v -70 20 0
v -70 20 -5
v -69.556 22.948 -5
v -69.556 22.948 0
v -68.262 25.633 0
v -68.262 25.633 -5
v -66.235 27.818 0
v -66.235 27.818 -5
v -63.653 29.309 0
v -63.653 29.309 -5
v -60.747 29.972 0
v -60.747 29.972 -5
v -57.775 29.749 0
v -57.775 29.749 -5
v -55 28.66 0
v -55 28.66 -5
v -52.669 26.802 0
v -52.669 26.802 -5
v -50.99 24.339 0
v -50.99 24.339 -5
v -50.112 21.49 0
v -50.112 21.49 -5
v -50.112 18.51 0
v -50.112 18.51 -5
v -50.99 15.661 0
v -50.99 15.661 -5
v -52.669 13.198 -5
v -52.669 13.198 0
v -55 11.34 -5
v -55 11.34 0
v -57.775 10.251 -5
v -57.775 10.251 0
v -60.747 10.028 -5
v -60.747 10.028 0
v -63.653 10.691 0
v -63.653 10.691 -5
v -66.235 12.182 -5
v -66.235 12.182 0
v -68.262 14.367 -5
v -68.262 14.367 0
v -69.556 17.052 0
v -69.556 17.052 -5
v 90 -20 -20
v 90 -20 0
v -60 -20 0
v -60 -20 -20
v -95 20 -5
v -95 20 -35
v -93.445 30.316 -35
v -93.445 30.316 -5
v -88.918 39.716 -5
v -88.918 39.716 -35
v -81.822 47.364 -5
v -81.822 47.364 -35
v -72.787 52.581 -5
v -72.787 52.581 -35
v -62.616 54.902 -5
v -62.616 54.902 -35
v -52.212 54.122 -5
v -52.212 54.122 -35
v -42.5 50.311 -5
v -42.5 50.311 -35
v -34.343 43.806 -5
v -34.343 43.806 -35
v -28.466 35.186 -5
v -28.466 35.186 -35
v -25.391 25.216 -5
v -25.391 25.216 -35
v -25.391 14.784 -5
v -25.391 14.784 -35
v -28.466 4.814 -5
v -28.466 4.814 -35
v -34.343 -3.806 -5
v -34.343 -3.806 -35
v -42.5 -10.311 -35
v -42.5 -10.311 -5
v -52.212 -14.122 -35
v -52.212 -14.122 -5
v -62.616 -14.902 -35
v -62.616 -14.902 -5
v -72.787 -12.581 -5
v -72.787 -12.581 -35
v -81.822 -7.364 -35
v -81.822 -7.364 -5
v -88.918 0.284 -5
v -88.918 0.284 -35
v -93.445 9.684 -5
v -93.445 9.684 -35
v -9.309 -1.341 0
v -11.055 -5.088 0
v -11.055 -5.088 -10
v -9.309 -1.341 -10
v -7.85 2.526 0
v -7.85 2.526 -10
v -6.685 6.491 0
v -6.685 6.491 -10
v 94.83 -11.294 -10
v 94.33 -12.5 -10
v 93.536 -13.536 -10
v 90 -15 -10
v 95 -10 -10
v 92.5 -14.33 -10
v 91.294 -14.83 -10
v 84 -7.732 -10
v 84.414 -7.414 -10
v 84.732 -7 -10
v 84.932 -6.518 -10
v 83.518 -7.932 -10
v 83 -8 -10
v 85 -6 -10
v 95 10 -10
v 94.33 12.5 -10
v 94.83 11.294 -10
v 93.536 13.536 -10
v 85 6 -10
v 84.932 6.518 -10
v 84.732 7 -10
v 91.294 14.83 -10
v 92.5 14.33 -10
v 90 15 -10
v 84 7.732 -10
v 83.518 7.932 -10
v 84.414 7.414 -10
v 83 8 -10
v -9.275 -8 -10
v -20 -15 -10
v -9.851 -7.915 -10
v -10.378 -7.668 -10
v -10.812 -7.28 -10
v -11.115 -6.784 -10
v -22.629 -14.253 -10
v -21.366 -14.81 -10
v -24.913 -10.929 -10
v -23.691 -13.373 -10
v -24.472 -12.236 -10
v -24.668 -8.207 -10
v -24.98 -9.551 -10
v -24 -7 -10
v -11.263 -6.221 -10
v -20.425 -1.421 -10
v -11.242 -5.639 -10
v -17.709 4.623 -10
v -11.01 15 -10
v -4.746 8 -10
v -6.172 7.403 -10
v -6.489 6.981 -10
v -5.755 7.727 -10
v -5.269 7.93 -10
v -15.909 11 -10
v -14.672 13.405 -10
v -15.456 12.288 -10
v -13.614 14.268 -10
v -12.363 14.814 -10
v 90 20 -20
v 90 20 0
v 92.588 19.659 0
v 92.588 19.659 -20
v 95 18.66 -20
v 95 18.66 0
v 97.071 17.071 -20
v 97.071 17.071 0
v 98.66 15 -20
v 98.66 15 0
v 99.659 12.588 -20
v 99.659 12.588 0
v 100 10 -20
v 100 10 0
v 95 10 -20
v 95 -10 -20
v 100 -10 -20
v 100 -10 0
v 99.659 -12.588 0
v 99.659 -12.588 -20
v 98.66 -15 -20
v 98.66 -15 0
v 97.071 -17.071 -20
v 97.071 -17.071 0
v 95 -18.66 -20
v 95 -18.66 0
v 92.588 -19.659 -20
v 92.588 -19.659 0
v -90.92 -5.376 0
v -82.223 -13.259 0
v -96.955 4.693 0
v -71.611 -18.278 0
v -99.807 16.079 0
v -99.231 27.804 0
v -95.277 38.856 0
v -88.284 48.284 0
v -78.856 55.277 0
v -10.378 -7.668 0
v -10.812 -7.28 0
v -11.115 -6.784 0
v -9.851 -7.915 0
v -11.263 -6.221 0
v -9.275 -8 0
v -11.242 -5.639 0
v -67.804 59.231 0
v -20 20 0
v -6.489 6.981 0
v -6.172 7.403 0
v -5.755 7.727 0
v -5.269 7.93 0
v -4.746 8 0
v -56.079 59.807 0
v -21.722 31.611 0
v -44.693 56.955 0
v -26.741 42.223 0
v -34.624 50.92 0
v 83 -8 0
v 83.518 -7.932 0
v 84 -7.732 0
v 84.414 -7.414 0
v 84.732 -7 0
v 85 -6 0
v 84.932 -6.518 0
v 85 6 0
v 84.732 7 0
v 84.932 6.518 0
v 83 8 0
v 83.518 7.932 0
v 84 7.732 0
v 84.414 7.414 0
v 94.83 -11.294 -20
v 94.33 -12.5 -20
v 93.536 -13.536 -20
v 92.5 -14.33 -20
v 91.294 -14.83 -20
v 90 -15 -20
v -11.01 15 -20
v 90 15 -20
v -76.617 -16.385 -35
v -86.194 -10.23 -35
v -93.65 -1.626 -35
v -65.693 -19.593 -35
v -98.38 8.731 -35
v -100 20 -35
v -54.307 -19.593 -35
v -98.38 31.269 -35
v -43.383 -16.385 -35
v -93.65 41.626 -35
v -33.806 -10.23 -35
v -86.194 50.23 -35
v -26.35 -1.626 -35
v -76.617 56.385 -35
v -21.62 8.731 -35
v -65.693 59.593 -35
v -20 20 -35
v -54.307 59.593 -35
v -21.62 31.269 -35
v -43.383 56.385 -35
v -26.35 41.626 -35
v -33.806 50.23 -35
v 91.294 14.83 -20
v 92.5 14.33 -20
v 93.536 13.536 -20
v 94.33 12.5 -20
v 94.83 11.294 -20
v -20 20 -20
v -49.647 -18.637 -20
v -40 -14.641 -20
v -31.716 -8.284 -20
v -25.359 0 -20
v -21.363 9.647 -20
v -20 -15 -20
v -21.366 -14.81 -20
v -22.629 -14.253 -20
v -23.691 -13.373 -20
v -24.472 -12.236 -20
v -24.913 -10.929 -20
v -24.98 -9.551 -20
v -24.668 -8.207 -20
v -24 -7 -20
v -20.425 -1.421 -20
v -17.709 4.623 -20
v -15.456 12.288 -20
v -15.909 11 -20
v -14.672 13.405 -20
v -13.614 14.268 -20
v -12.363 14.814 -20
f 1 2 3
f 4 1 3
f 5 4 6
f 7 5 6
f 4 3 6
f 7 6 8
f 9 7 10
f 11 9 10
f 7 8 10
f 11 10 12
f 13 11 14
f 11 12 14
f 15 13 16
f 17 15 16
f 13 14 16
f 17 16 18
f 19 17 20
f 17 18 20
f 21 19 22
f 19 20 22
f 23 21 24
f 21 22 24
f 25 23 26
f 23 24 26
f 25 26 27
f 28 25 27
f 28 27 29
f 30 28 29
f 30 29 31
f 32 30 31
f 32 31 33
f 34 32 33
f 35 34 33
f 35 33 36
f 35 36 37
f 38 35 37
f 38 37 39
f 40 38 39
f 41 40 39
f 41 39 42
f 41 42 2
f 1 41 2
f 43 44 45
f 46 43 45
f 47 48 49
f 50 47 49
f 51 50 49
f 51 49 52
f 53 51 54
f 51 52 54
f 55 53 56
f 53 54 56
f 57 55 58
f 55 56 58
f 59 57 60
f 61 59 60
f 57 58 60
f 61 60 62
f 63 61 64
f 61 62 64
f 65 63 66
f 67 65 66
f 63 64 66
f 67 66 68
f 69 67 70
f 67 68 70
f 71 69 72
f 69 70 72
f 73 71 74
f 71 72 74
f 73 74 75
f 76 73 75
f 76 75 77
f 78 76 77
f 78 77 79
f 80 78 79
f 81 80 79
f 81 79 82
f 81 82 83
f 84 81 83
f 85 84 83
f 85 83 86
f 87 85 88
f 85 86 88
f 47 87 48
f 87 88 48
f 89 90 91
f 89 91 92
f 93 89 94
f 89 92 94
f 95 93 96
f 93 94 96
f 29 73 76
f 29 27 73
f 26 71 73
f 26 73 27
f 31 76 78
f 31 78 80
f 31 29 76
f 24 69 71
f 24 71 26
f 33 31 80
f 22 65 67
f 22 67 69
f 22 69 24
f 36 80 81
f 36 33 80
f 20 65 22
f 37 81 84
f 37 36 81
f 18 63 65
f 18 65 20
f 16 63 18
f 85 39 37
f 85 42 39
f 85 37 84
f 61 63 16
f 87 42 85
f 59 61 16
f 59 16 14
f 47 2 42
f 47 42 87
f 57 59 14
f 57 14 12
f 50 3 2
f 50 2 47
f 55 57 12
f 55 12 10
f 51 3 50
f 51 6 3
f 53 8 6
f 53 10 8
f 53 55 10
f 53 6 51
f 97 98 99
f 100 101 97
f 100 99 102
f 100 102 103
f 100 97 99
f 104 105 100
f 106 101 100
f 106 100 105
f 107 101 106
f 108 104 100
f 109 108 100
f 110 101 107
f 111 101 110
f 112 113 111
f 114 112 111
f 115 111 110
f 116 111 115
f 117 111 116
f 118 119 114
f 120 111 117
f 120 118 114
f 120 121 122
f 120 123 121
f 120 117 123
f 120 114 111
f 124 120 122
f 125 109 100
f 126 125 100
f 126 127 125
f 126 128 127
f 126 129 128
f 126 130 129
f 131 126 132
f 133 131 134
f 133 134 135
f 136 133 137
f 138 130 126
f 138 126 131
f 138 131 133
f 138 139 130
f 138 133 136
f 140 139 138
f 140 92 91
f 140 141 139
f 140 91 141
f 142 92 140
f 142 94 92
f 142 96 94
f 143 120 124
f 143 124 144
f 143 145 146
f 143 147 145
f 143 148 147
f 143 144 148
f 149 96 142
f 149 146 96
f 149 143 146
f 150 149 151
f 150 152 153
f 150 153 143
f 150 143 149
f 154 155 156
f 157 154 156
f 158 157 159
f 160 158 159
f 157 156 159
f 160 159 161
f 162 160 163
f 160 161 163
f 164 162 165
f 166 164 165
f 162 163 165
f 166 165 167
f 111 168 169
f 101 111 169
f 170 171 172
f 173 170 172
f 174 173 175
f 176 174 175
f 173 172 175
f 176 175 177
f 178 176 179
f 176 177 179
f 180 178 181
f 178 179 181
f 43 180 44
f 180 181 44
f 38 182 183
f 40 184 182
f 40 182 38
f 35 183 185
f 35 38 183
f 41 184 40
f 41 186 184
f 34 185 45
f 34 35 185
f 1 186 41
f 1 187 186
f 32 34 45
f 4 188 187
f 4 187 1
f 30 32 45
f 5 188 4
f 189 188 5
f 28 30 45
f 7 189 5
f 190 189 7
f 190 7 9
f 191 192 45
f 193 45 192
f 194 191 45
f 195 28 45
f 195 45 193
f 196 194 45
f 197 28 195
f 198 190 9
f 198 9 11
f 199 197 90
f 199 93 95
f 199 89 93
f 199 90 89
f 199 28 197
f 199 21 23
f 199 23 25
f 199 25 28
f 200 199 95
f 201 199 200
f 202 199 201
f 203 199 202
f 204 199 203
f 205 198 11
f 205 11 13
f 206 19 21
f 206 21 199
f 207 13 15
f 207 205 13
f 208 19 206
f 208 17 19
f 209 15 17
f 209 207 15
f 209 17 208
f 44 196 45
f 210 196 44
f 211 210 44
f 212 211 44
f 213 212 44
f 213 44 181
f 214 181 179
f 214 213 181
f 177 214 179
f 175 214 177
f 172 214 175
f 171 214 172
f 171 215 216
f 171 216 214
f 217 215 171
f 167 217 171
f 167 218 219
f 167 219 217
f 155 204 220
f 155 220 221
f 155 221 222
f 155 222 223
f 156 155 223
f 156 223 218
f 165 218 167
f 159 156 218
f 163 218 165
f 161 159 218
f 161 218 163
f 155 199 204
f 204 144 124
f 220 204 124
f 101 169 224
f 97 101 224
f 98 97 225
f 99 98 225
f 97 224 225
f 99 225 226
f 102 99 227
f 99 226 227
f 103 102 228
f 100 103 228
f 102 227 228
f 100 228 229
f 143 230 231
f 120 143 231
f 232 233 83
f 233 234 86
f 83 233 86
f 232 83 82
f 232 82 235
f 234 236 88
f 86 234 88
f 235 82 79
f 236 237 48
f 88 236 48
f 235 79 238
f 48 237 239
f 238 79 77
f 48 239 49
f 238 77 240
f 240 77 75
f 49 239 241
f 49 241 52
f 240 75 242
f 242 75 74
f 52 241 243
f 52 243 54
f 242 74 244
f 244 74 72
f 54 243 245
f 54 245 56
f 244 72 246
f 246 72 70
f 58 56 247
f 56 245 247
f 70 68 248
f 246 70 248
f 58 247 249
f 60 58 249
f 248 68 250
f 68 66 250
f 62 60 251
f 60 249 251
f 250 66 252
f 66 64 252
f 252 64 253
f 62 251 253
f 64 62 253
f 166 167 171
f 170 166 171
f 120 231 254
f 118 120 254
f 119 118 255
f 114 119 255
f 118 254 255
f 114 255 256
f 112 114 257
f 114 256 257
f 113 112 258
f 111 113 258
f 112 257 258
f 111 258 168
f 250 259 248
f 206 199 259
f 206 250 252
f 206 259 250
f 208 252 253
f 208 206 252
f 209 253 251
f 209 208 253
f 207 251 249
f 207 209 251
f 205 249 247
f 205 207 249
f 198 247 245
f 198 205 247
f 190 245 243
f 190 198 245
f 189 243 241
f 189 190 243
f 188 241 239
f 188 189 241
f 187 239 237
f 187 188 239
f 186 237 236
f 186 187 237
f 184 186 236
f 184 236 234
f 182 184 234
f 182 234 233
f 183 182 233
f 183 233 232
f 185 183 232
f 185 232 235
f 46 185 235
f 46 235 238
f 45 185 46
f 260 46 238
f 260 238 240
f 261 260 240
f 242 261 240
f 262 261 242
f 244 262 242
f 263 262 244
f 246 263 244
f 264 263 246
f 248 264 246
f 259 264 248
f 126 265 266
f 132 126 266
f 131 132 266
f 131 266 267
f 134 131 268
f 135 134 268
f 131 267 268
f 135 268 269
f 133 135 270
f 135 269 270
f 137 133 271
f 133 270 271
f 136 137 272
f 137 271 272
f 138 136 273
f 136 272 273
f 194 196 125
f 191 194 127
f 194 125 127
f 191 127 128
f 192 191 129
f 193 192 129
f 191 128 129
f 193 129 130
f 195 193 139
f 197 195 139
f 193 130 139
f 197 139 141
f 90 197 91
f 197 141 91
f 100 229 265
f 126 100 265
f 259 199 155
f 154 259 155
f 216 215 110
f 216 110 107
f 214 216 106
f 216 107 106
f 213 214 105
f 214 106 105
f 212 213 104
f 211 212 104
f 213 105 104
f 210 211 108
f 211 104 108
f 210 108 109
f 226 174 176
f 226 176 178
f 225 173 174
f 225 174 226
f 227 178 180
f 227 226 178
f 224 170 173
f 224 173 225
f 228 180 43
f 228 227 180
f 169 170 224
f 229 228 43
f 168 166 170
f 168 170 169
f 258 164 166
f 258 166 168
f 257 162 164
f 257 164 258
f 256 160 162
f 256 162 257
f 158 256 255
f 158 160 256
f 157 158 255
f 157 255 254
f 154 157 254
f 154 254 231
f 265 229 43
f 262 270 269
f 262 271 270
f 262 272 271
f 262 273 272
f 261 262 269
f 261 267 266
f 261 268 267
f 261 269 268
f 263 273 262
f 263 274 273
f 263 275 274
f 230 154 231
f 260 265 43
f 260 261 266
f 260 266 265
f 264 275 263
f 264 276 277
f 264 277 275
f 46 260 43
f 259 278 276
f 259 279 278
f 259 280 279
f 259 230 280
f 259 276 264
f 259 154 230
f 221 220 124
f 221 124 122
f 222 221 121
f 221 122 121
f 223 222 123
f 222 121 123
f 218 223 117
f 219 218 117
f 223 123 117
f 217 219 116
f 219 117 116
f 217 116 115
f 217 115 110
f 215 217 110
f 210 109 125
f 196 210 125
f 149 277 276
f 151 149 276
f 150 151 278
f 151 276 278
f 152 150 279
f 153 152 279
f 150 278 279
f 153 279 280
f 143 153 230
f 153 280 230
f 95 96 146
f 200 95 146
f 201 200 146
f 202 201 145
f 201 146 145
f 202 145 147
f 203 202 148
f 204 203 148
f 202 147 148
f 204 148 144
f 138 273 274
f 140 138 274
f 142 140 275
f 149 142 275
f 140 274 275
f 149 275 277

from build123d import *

# Parameters (mm, degrees)
BASE_EXTRUDE_DEPTH  = 20
SKETCH3_R           = 40
BOSS_EXTRUDE1_DEPTH = 35
SKETCH4_R           = 35
CUT_EXTRUDE1_DEPTH  = 30
CUT_EXTRUDE2_DEPTH  = 10
SKETCH6_R           = 10
CUT_EXTRUDE3_DEPTH  = 121.415945788
CUT_EXTRUDE5_DEPTH  = 120.268604419


with BuildPart() as part:
    # Sketch1 → Base-Extrude (new body)
    with BuildSketch(Plane.XY):
        with BuildLine():
            Line((90, -20), (-60, -20))
            Line((-60, -20), (-60, 20))
            Line((-60, 20), (90, 20))
            ThreePointArc((90, 20), (97.071067812, 17.071067812), (100, 10))
            Line((100, 10), (100, -10))
            ThreePointArc((100, -10), (97.071067812, -17.071067812), (90, -20))
        make_face()
    extrude(amount=-BASE_EXTRUDE_DEPTH)

    # Sketch3 → Boss-Extrude1 (add)
    with BuildSketch(Plane.XY):
        with Locations((-60, 20)):
            Circle(SKETCH3_R)
    extrude(amount=-BOSS_EXTRUDE1_DEPTH)

    # Sketch4 → Cut-Extrude1 (cut)
    with BuildSketch(Plane(origin=(0, 0, -35), x_dir=(-1, 0, 0), z_dir=(0, 0, -1))):
        with Locations((60, 20)):
            Circle(SKETCH4_R)
    extrude(amount=-CUT_EXTRUDE1_DEPTH, mode=Mode.SUBTRACT)

    # Sketch5 → Cut-Extrude2 (cut)
    with BuildSketch(Plane(origin=(0, 0, -20), x_dir=(-1, 0, 0), z_dir=(0, 0, -1))):
        with BuildLine():
            Line((-90, -15), (20, -15))
            ThreePointArc((20, -15), (24.472135955, -12.236067977), (24, -7))
            ThreePointArc((24, -7), (18.955698609, 1.551007525), (15.90918463, 11))
            ThreePointArc((15.90918463, 11), (14.172482805, 13.872983346), (11.010205144, 15))
            Line((11.010205144, 15), (-90, 15))
            ThreePointArc((-90, 15), (-93.535533906, 13.535533906), (-95, 10))
            Line((-95, 10), (-95, -10))
            ThreePointArc((-95, -10), (-93.535533906, -13.535533906), (-90, -15))
        make_face()
    extrude(amount=-CUT_EXTRUDE2_DEPTH, mode=Mode.SUBTRACT)

    # Sketch6 → Cut-Extrude3 (cut, through all)
    with BuildSketch(Plane(origin=(0, 0, -5), x_dir=(-1, 0, 0), z_dir=(0, 0, -1))):
        with Locations((60, 20)):
            Circle(SKETCH6_R)
    extrude(amount=-CUT_EXTRUDE3_DEPTH, mode=Mode.SUBTRACT)

    # Sketch8 → Cut-Extrude5 (cut, through all)
    with BuildSketch(Plane(origin=(0, 0, -10), x_dir=(-1, 0, 0), z_dir=(0, 0, -1))):
        with BuildLine():
            Line((-83, -8), (9.275252588, -8))
            ThreePointArc((9.275252588, -8), (10.981793154, -7.042937821), (11.055068287, -5.087719298))
            ThreePointArc((11.055068287, -5.087719298), (8.543194297, 0.578436035), (6.684776274, 6.49122807))
            ThreePointArc((6.684776274, 6.49122807), (5.974361642, 7.578362465), (4.746040866, 8))
            Line((4.746040866, 8), (-83, 8))
            ThreePointArc((-83, 8), (-84.414213562, 7.414213562), (-85, 6))
            Line((-85, 6), (-85, -6))
            ThreePointArc((-85, -6), (-84.414213562, -7.414213562), (-83, -8))
        make_face()
    extrude(amount=-CUT_EXTRUDE5_DEPTH, mode=Mode.SUBTRACT)


solid = part.part
